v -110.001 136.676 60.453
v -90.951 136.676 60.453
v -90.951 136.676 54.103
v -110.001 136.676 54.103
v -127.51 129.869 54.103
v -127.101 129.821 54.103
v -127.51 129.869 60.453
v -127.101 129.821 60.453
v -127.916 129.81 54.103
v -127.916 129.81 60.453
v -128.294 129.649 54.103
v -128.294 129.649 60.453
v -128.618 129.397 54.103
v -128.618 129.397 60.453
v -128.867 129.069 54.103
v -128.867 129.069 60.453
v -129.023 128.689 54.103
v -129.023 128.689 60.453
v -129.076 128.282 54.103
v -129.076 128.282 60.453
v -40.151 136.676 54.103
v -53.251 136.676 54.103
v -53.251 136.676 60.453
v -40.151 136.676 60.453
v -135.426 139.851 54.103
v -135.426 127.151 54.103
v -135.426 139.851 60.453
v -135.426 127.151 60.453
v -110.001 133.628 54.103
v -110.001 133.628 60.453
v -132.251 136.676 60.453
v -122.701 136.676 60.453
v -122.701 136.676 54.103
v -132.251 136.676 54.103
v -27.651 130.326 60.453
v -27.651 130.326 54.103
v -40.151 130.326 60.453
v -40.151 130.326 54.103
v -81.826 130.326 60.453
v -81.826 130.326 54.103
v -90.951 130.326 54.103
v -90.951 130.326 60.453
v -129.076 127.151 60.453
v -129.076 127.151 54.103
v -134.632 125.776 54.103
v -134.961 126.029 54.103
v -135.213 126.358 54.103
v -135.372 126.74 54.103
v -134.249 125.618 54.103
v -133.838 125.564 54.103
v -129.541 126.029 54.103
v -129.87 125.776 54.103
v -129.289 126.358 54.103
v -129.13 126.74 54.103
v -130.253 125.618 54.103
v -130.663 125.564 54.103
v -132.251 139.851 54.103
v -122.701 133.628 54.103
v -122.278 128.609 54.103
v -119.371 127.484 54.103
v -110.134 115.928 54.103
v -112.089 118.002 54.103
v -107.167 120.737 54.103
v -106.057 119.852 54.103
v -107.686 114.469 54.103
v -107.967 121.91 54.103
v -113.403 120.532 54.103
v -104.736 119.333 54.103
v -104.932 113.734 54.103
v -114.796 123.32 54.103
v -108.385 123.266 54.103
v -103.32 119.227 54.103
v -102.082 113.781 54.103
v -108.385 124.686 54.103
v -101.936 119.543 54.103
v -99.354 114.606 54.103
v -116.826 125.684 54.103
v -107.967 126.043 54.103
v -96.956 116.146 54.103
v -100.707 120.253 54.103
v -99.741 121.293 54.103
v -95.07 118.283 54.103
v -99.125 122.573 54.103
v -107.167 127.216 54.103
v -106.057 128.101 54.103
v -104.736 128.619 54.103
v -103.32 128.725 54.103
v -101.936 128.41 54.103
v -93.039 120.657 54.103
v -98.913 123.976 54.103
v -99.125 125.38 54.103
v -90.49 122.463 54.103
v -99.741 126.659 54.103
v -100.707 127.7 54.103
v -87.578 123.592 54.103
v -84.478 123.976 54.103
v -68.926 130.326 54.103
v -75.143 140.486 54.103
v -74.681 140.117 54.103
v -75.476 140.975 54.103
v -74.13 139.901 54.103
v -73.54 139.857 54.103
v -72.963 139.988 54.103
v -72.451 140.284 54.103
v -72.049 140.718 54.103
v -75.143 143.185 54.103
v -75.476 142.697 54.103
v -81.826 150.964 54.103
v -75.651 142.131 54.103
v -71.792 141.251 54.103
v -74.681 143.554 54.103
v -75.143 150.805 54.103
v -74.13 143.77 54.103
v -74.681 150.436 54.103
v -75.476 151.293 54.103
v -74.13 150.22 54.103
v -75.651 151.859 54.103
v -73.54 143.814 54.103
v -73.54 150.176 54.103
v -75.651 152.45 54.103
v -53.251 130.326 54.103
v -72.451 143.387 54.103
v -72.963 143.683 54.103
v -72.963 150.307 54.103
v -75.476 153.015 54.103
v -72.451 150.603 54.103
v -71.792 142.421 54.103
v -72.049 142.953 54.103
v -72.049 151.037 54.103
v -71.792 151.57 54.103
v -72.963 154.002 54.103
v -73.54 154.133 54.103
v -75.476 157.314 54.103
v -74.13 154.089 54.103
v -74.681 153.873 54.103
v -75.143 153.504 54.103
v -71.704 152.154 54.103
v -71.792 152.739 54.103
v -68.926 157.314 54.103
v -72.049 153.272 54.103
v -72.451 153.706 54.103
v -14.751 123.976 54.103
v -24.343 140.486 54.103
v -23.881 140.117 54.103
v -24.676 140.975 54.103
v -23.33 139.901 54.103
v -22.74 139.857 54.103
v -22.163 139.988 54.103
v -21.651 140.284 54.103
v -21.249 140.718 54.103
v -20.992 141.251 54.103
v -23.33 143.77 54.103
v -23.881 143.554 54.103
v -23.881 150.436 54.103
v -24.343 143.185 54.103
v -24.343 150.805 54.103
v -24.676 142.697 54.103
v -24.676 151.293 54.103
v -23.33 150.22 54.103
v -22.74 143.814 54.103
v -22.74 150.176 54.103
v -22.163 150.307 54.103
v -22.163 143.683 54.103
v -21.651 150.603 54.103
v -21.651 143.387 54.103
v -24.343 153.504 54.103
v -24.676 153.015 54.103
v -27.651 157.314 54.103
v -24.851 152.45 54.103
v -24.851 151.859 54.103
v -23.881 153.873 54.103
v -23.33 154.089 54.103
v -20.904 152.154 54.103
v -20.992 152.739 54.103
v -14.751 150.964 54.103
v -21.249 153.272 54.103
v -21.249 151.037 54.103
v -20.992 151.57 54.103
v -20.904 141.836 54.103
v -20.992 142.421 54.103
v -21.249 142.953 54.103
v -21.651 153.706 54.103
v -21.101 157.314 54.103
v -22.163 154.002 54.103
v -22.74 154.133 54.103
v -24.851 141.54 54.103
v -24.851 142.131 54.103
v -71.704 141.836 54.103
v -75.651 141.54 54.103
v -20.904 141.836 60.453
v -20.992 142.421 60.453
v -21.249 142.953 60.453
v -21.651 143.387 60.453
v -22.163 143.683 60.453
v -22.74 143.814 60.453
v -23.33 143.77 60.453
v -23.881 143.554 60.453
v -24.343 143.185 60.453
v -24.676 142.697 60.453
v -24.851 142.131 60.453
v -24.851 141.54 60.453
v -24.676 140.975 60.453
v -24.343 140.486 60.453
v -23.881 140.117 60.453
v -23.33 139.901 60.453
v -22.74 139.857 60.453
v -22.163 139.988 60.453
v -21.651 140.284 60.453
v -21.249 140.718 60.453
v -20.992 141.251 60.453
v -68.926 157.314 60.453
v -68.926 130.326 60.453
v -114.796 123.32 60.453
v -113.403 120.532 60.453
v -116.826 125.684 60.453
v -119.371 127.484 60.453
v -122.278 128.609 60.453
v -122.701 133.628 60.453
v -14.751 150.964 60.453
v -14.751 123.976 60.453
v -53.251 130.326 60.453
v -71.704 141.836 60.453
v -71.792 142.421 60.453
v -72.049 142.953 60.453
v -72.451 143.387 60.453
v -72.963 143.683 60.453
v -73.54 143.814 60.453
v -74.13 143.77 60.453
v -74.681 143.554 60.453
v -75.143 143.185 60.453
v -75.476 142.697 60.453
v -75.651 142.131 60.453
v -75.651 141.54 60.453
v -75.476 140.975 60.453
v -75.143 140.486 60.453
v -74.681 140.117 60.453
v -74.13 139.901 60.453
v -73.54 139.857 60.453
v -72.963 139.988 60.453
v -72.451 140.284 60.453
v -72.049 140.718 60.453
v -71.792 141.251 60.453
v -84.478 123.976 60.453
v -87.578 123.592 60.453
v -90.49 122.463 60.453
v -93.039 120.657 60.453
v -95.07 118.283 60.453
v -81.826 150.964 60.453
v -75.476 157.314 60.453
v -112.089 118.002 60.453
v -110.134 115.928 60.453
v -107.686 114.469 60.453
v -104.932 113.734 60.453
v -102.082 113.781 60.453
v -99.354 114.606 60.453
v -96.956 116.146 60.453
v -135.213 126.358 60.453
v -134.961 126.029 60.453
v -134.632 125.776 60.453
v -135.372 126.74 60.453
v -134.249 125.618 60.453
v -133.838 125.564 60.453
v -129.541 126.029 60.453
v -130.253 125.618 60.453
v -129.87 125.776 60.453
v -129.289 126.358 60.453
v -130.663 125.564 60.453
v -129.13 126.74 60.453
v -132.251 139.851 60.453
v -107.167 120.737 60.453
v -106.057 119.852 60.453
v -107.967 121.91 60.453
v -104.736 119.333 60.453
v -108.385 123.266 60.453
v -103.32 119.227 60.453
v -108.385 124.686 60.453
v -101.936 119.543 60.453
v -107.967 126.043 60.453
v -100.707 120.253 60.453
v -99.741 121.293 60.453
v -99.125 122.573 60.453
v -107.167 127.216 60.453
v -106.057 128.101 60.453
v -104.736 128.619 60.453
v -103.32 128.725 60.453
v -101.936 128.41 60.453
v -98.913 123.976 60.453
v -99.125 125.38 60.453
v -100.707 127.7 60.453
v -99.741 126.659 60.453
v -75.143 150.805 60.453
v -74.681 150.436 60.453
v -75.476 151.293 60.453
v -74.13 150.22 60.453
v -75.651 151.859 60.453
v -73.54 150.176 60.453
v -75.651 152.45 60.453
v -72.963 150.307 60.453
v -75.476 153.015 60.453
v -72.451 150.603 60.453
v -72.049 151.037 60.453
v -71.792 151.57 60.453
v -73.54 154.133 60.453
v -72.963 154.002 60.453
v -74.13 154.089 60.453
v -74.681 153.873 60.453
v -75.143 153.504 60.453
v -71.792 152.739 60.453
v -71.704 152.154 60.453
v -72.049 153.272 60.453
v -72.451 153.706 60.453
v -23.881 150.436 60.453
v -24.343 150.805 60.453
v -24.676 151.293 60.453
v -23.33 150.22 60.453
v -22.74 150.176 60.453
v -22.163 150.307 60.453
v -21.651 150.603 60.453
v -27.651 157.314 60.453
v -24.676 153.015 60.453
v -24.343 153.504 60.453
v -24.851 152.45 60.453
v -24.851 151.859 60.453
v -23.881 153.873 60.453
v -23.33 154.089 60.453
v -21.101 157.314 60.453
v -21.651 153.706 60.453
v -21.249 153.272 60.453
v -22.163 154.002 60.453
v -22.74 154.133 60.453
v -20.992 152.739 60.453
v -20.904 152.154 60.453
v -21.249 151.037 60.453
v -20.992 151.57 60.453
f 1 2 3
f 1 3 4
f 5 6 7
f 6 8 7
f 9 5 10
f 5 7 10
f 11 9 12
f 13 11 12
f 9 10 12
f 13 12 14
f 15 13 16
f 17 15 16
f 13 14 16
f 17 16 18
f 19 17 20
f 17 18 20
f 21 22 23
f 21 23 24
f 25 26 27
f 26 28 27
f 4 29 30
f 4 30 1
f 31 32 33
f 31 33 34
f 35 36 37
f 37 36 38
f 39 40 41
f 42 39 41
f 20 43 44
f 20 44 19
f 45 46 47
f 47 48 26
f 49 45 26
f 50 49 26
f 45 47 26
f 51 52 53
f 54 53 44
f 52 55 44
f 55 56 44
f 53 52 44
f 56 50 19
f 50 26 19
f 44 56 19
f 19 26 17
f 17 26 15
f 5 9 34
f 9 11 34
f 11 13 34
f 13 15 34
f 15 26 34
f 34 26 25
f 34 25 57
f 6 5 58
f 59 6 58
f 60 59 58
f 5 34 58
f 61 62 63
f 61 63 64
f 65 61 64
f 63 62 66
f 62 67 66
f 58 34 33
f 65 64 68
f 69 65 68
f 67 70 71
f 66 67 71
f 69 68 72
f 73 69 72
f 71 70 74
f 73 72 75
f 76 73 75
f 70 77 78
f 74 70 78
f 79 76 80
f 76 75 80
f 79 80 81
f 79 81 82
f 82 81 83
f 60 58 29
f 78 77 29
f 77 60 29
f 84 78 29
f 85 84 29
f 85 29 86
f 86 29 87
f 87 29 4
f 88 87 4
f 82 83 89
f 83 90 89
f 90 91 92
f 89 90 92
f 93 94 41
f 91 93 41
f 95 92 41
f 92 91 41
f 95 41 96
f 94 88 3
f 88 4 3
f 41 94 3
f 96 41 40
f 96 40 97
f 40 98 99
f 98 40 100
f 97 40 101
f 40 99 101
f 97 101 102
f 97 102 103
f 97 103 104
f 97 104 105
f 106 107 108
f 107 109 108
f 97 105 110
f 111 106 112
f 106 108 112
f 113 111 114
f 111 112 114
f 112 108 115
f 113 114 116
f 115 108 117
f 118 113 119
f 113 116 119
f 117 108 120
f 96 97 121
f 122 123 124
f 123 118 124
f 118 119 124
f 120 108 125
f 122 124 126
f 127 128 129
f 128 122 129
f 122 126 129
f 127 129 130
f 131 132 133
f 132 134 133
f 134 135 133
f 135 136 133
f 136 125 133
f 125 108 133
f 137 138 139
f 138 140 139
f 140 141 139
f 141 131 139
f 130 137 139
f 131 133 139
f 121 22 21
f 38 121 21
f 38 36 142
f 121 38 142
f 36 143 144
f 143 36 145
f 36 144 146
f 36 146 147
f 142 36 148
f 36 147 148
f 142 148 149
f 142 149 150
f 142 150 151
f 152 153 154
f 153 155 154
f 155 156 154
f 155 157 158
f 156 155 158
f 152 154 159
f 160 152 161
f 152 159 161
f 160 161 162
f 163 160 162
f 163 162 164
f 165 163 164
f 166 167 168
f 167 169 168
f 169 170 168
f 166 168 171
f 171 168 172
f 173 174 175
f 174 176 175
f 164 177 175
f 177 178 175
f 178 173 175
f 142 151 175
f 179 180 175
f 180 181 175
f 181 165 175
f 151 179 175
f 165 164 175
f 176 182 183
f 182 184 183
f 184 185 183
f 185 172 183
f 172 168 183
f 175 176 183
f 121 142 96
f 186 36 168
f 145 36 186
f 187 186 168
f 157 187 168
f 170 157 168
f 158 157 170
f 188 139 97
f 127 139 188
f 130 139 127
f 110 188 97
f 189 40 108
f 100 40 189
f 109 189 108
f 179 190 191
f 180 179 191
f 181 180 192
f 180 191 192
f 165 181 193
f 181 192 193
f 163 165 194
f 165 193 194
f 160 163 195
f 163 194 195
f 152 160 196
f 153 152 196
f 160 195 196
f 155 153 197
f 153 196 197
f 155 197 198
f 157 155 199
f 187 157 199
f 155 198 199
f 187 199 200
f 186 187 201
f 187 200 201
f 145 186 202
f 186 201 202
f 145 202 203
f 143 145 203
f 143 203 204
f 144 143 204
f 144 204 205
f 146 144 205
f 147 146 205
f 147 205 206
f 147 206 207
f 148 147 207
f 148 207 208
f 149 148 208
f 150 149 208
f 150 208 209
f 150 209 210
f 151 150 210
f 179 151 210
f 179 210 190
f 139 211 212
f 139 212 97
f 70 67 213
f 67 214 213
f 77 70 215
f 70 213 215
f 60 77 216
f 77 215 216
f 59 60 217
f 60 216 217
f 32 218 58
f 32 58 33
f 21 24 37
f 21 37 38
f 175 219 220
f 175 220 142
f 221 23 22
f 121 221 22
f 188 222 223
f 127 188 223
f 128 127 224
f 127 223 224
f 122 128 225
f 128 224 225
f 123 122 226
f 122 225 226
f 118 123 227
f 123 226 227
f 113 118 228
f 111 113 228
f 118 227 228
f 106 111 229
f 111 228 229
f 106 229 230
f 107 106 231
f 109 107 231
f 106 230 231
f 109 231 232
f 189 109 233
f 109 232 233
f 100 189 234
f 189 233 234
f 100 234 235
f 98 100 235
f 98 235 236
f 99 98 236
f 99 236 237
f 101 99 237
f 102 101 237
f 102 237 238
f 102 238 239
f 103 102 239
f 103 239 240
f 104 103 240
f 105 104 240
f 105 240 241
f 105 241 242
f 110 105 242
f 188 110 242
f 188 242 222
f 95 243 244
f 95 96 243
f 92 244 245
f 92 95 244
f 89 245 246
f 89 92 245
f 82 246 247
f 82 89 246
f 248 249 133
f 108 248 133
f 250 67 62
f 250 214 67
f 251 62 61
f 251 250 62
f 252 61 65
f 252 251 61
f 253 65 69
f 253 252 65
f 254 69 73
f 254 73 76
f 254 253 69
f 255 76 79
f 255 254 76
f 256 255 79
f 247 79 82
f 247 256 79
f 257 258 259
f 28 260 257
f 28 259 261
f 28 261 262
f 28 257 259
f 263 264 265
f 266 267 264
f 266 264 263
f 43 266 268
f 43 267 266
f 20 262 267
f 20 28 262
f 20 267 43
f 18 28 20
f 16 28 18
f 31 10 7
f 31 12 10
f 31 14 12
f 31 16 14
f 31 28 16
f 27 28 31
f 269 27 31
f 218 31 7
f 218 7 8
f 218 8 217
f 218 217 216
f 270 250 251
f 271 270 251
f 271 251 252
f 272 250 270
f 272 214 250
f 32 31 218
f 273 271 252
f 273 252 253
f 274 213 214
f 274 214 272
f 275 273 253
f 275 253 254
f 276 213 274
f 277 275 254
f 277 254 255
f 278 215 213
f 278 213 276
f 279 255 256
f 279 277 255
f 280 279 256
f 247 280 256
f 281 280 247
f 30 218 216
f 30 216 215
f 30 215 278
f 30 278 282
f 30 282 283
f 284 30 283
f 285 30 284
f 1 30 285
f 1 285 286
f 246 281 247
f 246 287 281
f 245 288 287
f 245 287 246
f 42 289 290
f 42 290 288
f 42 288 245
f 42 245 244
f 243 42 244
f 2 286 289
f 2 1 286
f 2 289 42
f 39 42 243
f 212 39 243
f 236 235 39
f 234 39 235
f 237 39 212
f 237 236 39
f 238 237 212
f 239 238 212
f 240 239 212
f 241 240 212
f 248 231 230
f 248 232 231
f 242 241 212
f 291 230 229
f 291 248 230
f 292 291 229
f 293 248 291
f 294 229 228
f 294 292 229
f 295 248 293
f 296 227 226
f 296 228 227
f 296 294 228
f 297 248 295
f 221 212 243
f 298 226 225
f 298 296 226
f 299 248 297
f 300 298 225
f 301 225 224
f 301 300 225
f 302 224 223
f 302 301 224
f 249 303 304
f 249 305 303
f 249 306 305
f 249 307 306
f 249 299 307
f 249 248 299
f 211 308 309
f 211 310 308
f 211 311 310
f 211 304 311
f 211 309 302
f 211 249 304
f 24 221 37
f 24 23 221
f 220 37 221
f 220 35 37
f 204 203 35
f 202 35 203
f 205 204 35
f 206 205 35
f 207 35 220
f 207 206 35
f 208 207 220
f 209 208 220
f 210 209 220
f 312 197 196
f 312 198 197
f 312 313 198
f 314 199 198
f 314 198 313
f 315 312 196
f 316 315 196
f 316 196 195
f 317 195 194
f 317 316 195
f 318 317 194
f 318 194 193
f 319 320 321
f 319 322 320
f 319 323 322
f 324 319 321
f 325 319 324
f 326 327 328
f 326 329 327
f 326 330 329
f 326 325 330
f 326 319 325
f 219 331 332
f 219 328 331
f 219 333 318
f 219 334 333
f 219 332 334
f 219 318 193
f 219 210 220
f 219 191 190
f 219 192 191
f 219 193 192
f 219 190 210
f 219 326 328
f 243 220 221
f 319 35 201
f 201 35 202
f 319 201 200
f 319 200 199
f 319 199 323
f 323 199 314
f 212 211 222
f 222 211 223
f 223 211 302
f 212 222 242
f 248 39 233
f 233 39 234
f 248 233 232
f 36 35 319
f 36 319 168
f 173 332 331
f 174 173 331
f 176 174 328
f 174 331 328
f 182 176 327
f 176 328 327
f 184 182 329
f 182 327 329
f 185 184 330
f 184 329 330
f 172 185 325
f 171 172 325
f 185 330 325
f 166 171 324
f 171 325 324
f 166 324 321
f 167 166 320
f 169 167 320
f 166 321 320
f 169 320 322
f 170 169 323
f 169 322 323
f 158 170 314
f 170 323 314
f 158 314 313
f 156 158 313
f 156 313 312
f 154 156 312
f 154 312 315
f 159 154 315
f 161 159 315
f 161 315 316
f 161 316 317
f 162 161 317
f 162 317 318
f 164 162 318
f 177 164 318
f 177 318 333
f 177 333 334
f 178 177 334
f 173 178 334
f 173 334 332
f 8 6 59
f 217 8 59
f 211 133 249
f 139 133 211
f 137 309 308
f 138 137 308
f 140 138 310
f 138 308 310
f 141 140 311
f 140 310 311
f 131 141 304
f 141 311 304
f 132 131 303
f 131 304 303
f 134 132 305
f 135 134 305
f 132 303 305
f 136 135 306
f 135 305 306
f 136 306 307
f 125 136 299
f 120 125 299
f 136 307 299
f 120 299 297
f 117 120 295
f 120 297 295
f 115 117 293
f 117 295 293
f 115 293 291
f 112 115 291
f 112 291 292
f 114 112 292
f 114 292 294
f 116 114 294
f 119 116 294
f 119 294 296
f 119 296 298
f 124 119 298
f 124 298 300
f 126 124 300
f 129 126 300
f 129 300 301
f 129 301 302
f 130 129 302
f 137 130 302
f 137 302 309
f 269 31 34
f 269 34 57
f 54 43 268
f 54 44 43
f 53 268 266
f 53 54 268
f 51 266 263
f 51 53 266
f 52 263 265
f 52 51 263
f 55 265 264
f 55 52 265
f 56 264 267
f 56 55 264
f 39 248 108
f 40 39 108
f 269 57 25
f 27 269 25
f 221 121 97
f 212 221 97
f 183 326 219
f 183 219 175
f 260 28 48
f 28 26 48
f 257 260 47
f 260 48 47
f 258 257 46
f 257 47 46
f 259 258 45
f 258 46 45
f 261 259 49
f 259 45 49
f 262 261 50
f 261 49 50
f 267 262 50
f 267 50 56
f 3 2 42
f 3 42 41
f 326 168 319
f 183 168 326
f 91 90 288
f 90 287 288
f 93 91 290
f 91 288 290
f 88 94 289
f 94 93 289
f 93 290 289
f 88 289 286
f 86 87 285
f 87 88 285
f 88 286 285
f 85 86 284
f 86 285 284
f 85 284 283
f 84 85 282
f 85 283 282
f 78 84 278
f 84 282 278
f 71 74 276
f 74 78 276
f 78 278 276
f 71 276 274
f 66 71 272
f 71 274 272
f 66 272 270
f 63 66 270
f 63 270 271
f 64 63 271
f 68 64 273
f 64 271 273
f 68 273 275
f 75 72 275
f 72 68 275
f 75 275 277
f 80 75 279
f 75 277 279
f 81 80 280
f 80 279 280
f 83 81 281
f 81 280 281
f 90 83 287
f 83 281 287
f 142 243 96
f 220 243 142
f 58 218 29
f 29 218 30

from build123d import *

# Parameters (mm, degrees)
SKETCH1_W               = 12.9
SKETCH1_H               = 6.35
BOSS_EXTRUDE1_DEPTH     = 6.35
BOSS_EXTRUDE1_2_DEPTH   = 6.35
SKETCH1_W_2             = 13.1
BOSS_EXTRUDE1_3_DEPTH   = 6.35
BOSS_EXTRUDE1_4_DEPTH   = 6.35
SKETCH2_W               = 88.9
SKETCH2_H               = 6.35
BOSS_EXTRUDE2_DEPTH     = 12.7
SKETCH3_W               = 12.9
SKETCH3_H               = 6.35
BOSS_EXTRUDE3_DEPTH     = 20.6375
CHAMFER1_SIZE           = 6.35
SKETCH4_R               = 1.984375
CUT_EXTRUDE1_DEPTH      = 7.35
SKETCH12_W              = 6.35
SKETCH12_H              = 12.7
BOSS_EXTRUDE6_DEPTH     = 0.2
SKETCH13_W              = 89.1
SKETCH13_H              = 6.35
CUT_EXTRUDE2_DEPTH      = 7.35
BOSS_EXTRUDE7_DEPTH     = 6.35
SKETCH19_R              = 10.31875
SKETCH19_R_2            = 4.7625
BOSS_EXTRUDE8_DEPTH     = 6.35
SKETCH20_R              = 4.7625
CUT_EXTRUDE3_DEPTH      = 1
CUT_EXTRUDE3_DEPTH_BACK = 7.35
FILLET2_R               = 12.7
SKETCH21_W              = 6.35
SKETCH21_H              = 6.35
BOSS_EXTRUDE9_DEPTH     = 6.35
FILLET4_R               = 1.5875
SKETCH22_W              = 12.7
SKETCH22_H              = 3.048
CUT_EXTRUDE4_DEPTH      = 7.35


with BuildPart() as part:
    # Sketch1 → Boss-Extrude1 (new body)
    with BuildSketch(Plane(origin=(0, 136.676286052, 0), x_dir=(1, 0, 0), z_dir=(0, 1, 0))):
        with Locations((-97.400963438, -57.278255958)):
            Rectangle(SKETCH1_W, SKETCH1_H)
    extrude(amount=-BOSS_EXTRUDE1_DEPTH)



with BuildPart() as body_2:
    # Sketch1 → Boss-Extrude1 2 (new body)
    with BuildSketch(Plane(origin=(0, 136.676286052, 0), x_dir=(1, 0, 0), z_dir=(0, 1, 0))):
        with Locations((-75.375963438, -57.278255958)):
            Rectangle(SKETCH1_W, SKETCH1_H)
    extrude(amount=-BOSS_EXTRUDE1_2_DEPTH)


with BuildPart() as body_3:
    # Sketch1 → Boss-Extrude1 3 (new body)
    with BuildSketch(Plane(origin=(0, 136.676286052, 0), x_dir=(1, 0, 0), z_dir=(0, 1, 0))):
        with Locations((-46.700963438, -57.278255958)):
            Rectangle(SKETCH1_W_2, SKETCH1_H)
    extrude(amount=-BOSS_EXTRUDE1_3_DEPTH)


with BuildPart() as body_4:
    # Sketch1 → Boss-Extrude1 4 (new body)
    with BuildSketch(Plane(origin=(0, 136.676286052, 0), x_dir=(1, 0, 0), z_dir=(0, 1, 0))):
        with Locations((-21.200963438, -57.278255958)):
            Rectangle(SKETCH1_W, SKETCH1_H)
    extrude(amount=-BOSS_EXTRUDE1_4_DEPTH)


with BuildPart() as part_1:
    add(part.part)

    add(body_2.part)  # Boss-Extrude2 merges body 2

    add(body_3.part)  # Boss-Extrude2 merges body 3

    add(body_4.part)  # Boss-Extrude2 merges body 4
    # Sketch2 → Boss-Extrude2 (add)
    with BuildSketch(Plane(origin=(0, 130.326286052, 0), x_dir=(-1, 0, 0), z_dir=(0, -1, 0))):
        with Locations((59.400963438, -57.278255958)):
            Rectangle(SKETCH2_W, SKETCH2_H)
    extrude(amount=BOSS_EXTRUDE2_DEPTH)

    # Sketch3 → Boss-Extrude3 (add)
    with BuildSketch(Plane(origin=(0, 136.676286052, 0), x_dir=(1, 0, 0), z_dir=(0, 1, 0))):
        with Locations((-75.375963438, -57.278255958)):
            Rectangle(SKETCH3_W, SKETCH3_H)
        with Locations((-21.200963438, -57.278255958)):
            Rectangle(SKETCH3_W, SKETCH3_H)
    extrude(amount=BOSS_EXTRUDE3_DEPTH)

    # Chamfer1
    chamfer1_edges = [part_1.edges().sort_by_distance(p)[0] for p in [
        (-81.825963438, 157.313786052, 57.278255958),
        (-14.750963438, 157.313786052, 57.278255958),
    ]]
    chamfer(chamfer1_edges, length=CHAMFER1_SIZE)

    # Sketch4 → Cut-Extrude1 (cut, through all)
    with BuildSketch(Plane.XY.offset(60.453255958)):
        with Locations((-73.688463438, 152.154411052)):
            Circle(SKETCH4_R)
        with Locations((-73.688463438, 141.835661052)):
            Circle(SKETCH4_R)
        with Locations((-22.888463438, 141.835661052)):
            Circle(SKETCH4_R)
        with Locations((-22.888463438, 152.154411052)):
            Circle(SKETCH4_R)
    extrude(amount=-CUT_EXTRUDE1_DEPTH, mode=Mode.SUBTRACT)

    # Sketch12 → Boss-Extrude6 (add)
    with BuildSketch(Plane(origin=(-14.950963438, 0, 0), x_dir=(0, 0, -1), z_dir=(1, 0, 0))):
        with Locations((-57.278255958, 123.976286052)):
            Rectangle(SKETCH12_W, SKETCH12_H)
    extrude(amount=BOSS_EXTRUDE6_DEPTH)

    # Sketch13 → Cut-Extrude2 (cut, through all)
    with BuildSketch(Plane.XY.offset(60.453255958)):
        with Locations((-59.300963438, 120.801286052)):
            Rectangle(SKETCH13_W, SKETCH13_H)
    extrude(amount=-CUT_EXTRUDE2_DEPTH, mode=Mode.SUBTRACT)

    # Sketch14 → Boss-Extrude7 (add)
    with BuildSketch(Plane.XY.offset(60.453255958)):
        Polygon((-132.250963468, 139.851286052), (-135.425963468, 139.851286052), (-135.425963468, 131.913786052), (-103.850963438, 123.976286052), (-103.850963438, 136.676286052), (-132.250963468, 136.676286052), align=None)
    extrude(amount=-BOSS_EXTRUDE7_DEPTH)

    # Sketch19 → Boss-Extrude8 (add)
    with BuildSketch(Plane.XY.offset(60.453255958)):
        with Locations((-103.675963468, 123.976286052)):
            Circle(SKETCH19_R)
        with Locations((-103.675963468, 123.976286052)):
            Circle(SKETCH19_R_2, mode=Mode.SUBTRACT)
    extrude(amount=-BOSS_EXTRUDE8_DEPTH)

    # Sketch20 → Cut-Extrude3 (cut, two sides)
    with BuildSketch(Plane.XY.offset(60.453255958)) as cut_extrude3_sk:
        with Locations((-103.675963468, 123.976286052)):
            Circle(SKETCH20_R)
    extrude(amount=CUT_EXTRUDE3_DEPTH, mode=Mode.SUBTRACT)
    extrude(cut_extrude3_sk.sketch, amount=-CUT_EXTRUDE3_DEPTH_BACK, mode=Mode.SUBTRACT)

    # Fillet2
    fillet2_edges = [part_1.edges().sort_by_distance(p)[0] for p in [
        (-113.693666461, 126.450599755, 57.278255958),
        (-93.357213468, 123.976286052, 57.278255958),
    ]]
    fillet(fillet2_edges, radius=FILLET2_R)

    # Sketch21 → Boss-Extrude9 (add)
    with BuildSketch(Plane.XY.offset(60.453255958)):
        with Locations((-132.250963468, 128.738786052)):
            Rectangle(SKETCH21_W, SKETCH21_H)
    extrude(amount=-BOSS_EXTRUDE9_DEPTH)

    # Fillet4
    fillet4_edges = [part_1.edges().sort_by_distance(p)[0] for p in [
        (-129.075963468, 130.317487558, 57.278255958),
        (-129.075963468, 125.563786052, 57.278255958),
        (-135.425963468, 125.563786052, 57.278255958),
    ]]
    fillet(fillet4_edges, radius=FILLET4_R)

    # Sketch22 → Cut-Extrude4 (cut, through all)
    with BuildSketch(Plane.XY.offset(60.453255958)):
        with Locations((-116.350963438, 135.152286052)):
            Rectangle(SKETCH22_W, SKETCH22_H)
    extrude(amount=-CUT_EXTRUDE4_DEPTH, mode=Mode.SUBTRACT)


solid = part_1.part
